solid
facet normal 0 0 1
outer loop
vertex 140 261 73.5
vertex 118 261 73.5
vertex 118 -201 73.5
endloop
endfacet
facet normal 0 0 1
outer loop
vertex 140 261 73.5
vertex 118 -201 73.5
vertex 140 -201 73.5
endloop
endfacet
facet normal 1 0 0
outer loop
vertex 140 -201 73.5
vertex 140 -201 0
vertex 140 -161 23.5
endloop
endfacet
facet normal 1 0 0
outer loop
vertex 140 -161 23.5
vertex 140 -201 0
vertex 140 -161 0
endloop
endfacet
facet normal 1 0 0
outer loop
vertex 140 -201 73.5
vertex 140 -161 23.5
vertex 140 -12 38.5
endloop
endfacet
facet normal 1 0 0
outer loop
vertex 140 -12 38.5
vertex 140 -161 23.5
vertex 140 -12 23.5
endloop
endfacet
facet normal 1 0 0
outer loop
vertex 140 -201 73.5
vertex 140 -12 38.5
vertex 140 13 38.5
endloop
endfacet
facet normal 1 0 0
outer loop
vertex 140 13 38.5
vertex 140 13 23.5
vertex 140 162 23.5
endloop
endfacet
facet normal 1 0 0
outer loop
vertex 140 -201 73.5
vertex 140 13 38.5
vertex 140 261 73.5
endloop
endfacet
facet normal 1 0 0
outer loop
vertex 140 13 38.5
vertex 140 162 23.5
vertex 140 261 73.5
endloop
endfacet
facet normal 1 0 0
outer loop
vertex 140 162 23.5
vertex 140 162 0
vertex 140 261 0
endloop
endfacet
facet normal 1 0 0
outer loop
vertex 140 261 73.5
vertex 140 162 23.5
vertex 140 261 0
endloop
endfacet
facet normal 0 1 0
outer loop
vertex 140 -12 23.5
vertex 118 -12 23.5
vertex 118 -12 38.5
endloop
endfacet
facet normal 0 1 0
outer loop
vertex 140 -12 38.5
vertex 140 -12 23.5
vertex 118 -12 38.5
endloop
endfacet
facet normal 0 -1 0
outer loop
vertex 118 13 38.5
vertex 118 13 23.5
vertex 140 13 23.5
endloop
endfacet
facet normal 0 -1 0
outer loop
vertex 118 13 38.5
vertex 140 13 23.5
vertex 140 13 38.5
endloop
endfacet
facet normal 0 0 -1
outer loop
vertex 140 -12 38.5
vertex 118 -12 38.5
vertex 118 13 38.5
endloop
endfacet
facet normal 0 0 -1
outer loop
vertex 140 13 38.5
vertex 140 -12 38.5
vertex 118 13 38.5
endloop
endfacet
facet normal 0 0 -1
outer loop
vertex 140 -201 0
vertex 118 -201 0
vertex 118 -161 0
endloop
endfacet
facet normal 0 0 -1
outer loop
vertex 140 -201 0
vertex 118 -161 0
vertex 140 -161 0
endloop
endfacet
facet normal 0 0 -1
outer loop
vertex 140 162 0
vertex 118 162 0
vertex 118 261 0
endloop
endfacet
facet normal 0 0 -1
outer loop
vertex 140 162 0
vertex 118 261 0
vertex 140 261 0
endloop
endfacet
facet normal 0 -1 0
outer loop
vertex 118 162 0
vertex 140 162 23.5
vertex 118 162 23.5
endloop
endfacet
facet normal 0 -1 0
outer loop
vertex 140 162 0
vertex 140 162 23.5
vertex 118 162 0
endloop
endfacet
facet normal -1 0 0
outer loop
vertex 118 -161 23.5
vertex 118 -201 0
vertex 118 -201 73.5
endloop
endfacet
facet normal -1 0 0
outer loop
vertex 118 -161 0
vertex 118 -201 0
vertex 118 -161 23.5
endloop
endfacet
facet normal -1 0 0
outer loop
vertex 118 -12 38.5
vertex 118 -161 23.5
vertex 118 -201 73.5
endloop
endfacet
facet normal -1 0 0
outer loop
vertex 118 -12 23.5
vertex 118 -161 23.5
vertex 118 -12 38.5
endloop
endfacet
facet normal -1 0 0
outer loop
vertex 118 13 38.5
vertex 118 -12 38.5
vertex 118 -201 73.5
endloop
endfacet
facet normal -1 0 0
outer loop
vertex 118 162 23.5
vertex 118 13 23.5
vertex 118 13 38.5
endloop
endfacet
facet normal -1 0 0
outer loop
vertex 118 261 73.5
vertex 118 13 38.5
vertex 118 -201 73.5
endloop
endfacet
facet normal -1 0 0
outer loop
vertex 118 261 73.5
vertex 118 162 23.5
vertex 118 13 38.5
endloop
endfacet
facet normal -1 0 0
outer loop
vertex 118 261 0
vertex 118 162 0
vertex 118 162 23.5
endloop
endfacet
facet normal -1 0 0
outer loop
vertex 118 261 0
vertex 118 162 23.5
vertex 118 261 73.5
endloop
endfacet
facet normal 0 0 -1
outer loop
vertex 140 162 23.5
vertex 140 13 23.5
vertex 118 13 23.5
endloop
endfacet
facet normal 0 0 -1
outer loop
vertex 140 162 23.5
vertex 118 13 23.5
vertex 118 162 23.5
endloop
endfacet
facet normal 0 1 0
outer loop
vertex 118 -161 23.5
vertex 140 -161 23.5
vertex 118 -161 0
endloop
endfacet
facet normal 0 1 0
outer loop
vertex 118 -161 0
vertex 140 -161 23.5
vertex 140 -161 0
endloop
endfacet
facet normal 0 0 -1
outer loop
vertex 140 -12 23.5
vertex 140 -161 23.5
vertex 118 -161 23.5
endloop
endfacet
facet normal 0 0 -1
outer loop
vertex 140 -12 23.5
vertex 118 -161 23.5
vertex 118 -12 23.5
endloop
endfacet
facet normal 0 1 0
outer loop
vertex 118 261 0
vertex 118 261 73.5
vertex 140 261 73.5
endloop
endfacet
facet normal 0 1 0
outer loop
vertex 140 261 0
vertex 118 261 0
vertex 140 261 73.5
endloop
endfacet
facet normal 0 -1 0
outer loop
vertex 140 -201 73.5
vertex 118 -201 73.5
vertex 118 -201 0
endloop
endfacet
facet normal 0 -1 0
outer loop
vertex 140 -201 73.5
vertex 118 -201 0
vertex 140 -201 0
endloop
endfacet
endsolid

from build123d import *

# Parameters (mm, degrees)
ESQUISSE1_W             = 22
ESQUISSE1_H             = 462
BOSS_EXTRU_1_DEPTH      = 73.5
ESQUISSE2_W             = 38.5
ESQUISSE2_H             = 25
ENL_V_MAT_EXTRU_1_DEPTH = 35
ESQUISSE3_W             = 23.5
ESQUISSE3_H             = 323
ENL_V_MAT_EXTRU_2_DEPTH = 35


with BuildPart() as part:
    # Esquisse1 → Boss.-Extru.1 (new body)
    with BuildSketch(Plane.XY):
        with Locations((129, 30)):
            Rectangle(ESQUISSE1_W, ESQUISSE1_H)
    extrude(amount=BOSS_EXTRU_1_DEPTH)

    # Esquisse2 → Enlèv. mat.-Extru.1 (cut)
    with BuildSketch(Plane.ZY.offset(-118)):
        with Locations((19.25, 0.5)):
            Rectangle(ESQUISSE2_W, ESQUISSE2_H)
    extrude(amount=-ENL_V_MAT_EXTRU_1_DEPTH, mode=Mode.SUBTRACT)

    # Esquisse3 → Enlèv. mat.-Extru.2 (cut)
    with BuildSketch(Plane(origin=(140, 0, 0), x_dir=(0, 0, -1), z_dir=(1, 0, 0))):
        with Locations((-11.75, 0.5)):
            Rectangle(ESQUISSE3_W, ESQUISSE3_H)
    extrude(amount=-ENL_V_MAT_EXTRU_2_DEPTH, mode=Mode.SUBTRACT)


solid = part.part
